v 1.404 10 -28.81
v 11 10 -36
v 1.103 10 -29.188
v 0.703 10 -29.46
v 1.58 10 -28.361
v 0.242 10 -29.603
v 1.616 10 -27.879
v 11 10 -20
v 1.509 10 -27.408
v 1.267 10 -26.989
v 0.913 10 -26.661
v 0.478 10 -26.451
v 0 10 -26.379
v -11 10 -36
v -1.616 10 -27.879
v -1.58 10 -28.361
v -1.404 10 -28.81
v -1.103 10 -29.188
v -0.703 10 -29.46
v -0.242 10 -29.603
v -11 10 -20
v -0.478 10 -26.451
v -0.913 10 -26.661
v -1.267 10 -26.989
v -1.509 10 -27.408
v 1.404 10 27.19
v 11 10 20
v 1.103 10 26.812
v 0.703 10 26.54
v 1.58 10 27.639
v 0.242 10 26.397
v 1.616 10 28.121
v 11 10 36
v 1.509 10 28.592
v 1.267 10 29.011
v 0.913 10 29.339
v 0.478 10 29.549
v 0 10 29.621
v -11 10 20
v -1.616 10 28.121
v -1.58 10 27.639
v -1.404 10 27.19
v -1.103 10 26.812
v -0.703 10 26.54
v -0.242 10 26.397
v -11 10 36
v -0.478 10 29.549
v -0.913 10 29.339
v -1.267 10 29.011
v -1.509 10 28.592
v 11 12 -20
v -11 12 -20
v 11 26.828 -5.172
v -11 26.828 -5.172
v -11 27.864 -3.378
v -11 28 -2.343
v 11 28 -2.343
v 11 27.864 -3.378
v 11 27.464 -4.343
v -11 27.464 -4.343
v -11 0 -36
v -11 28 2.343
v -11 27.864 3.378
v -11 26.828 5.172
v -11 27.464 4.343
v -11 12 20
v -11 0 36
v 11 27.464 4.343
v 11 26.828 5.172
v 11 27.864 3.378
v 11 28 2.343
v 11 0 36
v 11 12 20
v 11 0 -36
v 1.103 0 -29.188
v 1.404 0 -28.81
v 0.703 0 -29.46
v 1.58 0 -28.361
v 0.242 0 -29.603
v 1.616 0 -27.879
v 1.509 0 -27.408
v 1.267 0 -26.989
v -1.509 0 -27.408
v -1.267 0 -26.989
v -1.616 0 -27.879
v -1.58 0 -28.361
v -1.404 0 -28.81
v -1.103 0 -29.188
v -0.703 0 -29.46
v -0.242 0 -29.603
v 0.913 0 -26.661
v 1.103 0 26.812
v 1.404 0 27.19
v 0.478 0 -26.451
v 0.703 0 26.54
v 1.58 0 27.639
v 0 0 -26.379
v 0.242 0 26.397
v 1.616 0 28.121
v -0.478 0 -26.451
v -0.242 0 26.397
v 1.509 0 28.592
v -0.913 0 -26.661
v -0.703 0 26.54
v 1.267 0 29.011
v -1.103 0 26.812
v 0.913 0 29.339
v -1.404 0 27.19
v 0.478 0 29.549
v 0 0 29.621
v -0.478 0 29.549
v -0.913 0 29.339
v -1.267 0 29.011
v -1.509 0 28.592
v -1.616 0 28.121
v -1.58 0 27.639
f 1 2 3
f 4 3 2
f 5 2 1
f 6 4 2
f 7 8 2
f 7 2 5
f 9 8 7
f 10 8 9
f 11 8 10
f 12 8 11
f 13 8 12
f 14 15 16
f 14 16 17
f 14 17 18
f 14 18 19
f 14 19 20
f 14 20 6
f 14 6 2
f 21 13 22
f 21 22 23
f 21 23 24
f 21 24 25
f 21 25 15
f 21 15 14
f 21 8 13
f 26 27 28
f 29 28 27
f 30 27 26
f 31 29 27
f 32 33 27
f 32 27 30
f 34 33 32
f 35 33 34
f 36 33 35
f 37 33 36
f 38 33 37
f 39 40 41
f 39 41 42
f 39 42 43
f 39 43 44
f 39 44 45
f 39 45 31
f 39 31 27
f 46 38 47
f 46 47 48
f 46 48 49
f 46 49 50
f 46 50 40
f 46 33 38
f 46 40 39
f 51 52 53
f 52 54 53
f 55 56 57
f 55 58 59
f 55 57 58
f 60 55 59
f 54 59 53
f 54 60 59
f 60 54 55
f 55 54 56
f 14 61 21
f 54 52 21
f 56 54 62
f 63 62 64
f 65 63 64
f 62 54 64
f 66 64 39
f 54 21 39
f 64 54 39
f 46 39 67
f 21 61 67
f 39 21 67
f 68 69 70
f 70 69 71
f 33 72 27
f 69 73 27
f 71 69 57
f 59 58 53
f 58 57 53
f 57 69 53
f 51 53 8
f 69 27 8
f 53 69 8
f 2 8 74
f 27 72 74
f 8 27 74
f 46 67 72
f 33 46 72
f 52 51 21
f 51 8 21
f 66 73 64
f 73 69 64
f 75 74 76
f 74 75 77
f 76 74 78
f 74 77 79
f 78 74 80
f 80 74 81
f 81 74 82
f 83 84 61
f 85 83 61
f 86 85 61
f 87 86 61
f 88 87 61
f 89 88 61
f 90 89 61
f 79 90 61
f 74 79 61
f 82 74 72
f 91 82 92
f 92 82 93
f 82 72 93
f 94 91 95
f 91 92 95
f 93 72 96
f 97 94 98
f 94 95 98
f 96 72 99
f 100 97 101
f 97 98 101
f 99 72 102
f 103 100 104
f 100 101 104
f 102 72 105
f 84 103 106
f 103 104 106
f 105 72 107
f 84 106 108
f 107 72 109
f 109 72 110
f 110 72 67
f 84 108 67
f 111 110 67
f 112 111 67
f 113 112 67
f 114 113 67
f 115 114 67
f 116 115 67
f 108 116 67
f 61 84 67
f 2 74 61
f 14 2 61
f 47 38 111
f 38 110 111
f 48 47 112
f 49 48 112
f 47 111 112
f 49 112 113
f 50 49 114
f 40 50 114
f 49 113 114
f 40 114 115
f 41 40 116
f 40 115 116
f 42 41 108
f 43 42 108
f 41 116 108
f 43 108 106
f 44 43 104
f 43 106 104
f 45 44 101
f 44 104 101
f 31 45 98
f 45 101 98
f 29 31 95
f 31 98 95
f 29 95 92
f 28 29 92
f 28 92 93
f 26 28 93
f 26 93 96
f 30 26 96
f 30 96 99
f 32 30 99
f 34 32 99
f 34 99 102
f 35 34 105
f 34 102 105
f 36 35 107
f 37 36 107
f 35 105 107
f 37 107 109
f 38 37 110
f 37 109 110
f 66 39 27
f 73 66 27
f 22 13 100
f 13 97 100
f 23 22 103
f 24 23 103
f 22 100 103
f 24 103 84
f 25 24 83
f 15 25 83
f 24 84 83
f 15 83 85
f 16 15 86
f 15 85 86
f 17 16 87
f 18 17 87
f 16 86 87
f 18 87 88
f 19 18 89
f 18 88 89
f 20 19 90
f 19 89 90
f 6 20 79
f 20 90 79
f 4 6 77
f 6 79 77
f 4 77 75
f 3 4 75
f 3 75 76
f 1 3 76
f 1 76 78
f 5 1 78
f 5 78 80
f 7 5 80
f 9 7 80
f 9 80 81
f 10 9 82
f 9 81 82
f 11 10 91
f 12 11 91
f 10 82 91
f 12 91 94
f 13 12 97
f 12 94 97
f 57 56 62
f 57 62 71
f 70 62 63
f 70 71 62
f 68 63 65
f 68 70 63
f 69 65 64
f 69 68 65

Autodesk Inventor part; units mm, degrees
ref_plane "YZ Plane" through (0, 0, 0) normal (1, 0, 0) x (0, 1, 0)
ref_plane "XZ Plane" through (0, 0, 0) normal (0, 1, 0) x (-1, 0, 0)
ref_plane "XY Plane" through (0, 0, 0) normal (0, 0, 1) x (1, 0, 0)
sketch "Sketch1" plane through (0, 0, 0) normal (0, 1, 0) x (-1, 0, 0)
  line L0 (11, 36) -> (-11, 36)
  line L1 (-11, 36) -> (-11, -36)
  line L2 (-11, -36) -> (11, -36)
  line L3 (11, -36) -> (11, 36)
  line L4 (11, 36) -> (-11, -36) construction
  line L5 (-11, 36) -> (11, -36) construction
  point P0 (0, 0)
extrude "Extrusion1" add sketch "Sketch1" along normal blind 10
sketch "Sketch2" plane through (0, 10, 0) normal (0, 1, 0) x (1, 0, 0)
  point P0 (0, 0)
  point P1 (0, -28)
  point P2 (0, 28)
hole "Hole1" at (0, 10, 28) at (0, 10, -28) direction (0, -1, 0) diameter 3.242 depth 10 thread size "M4x0.7" class "6H" standard "ISO Metric profile"
sketch "Sketch3" plane through (0, 10, 0) normal (0, 1, 0) x (1, 0, 0)
  line L0 (11, -36) -> (11, 36) projected
  line L1 (-11, -20) -> (11, -20)
  line L2 (11, -20) -> (11, 20)
  line L3 (11, 20) -> (-11, 20)
  line L4 (-11, 20) -> (-11, -20)
  line L5 (-11, -20) -> (11, 20) construction
  line L6 (11, -20) -> (-11, 20) construction
  point P0 (0, 0)
extrude "Extrusion2" add sketch "Sketch3" along normal blind 18
chamfer "Chamfer1" distance 16 angle 45 2 edges at (0, 28, -20) (0, 28, 20)
fillet "Fillet1" radius 4 2 edges at (0, 28, 4) (0, 28, -4)
sketch "Sketch4" plane through (-11, 12, 20) normal (0, 0.7071, 0.7071) x (1, 0, 0)
  point P0 (11, 5.6569)
  point P1 (11, 12)
sketch "Sketch5" plane through (11, 12, -20) normal (0, 0.7071, -0.7071) x (-1, 0, 0)
  point P0 (11, 5.6569)
  point P1 (11, 12)
properties part number "StrutConnector"
